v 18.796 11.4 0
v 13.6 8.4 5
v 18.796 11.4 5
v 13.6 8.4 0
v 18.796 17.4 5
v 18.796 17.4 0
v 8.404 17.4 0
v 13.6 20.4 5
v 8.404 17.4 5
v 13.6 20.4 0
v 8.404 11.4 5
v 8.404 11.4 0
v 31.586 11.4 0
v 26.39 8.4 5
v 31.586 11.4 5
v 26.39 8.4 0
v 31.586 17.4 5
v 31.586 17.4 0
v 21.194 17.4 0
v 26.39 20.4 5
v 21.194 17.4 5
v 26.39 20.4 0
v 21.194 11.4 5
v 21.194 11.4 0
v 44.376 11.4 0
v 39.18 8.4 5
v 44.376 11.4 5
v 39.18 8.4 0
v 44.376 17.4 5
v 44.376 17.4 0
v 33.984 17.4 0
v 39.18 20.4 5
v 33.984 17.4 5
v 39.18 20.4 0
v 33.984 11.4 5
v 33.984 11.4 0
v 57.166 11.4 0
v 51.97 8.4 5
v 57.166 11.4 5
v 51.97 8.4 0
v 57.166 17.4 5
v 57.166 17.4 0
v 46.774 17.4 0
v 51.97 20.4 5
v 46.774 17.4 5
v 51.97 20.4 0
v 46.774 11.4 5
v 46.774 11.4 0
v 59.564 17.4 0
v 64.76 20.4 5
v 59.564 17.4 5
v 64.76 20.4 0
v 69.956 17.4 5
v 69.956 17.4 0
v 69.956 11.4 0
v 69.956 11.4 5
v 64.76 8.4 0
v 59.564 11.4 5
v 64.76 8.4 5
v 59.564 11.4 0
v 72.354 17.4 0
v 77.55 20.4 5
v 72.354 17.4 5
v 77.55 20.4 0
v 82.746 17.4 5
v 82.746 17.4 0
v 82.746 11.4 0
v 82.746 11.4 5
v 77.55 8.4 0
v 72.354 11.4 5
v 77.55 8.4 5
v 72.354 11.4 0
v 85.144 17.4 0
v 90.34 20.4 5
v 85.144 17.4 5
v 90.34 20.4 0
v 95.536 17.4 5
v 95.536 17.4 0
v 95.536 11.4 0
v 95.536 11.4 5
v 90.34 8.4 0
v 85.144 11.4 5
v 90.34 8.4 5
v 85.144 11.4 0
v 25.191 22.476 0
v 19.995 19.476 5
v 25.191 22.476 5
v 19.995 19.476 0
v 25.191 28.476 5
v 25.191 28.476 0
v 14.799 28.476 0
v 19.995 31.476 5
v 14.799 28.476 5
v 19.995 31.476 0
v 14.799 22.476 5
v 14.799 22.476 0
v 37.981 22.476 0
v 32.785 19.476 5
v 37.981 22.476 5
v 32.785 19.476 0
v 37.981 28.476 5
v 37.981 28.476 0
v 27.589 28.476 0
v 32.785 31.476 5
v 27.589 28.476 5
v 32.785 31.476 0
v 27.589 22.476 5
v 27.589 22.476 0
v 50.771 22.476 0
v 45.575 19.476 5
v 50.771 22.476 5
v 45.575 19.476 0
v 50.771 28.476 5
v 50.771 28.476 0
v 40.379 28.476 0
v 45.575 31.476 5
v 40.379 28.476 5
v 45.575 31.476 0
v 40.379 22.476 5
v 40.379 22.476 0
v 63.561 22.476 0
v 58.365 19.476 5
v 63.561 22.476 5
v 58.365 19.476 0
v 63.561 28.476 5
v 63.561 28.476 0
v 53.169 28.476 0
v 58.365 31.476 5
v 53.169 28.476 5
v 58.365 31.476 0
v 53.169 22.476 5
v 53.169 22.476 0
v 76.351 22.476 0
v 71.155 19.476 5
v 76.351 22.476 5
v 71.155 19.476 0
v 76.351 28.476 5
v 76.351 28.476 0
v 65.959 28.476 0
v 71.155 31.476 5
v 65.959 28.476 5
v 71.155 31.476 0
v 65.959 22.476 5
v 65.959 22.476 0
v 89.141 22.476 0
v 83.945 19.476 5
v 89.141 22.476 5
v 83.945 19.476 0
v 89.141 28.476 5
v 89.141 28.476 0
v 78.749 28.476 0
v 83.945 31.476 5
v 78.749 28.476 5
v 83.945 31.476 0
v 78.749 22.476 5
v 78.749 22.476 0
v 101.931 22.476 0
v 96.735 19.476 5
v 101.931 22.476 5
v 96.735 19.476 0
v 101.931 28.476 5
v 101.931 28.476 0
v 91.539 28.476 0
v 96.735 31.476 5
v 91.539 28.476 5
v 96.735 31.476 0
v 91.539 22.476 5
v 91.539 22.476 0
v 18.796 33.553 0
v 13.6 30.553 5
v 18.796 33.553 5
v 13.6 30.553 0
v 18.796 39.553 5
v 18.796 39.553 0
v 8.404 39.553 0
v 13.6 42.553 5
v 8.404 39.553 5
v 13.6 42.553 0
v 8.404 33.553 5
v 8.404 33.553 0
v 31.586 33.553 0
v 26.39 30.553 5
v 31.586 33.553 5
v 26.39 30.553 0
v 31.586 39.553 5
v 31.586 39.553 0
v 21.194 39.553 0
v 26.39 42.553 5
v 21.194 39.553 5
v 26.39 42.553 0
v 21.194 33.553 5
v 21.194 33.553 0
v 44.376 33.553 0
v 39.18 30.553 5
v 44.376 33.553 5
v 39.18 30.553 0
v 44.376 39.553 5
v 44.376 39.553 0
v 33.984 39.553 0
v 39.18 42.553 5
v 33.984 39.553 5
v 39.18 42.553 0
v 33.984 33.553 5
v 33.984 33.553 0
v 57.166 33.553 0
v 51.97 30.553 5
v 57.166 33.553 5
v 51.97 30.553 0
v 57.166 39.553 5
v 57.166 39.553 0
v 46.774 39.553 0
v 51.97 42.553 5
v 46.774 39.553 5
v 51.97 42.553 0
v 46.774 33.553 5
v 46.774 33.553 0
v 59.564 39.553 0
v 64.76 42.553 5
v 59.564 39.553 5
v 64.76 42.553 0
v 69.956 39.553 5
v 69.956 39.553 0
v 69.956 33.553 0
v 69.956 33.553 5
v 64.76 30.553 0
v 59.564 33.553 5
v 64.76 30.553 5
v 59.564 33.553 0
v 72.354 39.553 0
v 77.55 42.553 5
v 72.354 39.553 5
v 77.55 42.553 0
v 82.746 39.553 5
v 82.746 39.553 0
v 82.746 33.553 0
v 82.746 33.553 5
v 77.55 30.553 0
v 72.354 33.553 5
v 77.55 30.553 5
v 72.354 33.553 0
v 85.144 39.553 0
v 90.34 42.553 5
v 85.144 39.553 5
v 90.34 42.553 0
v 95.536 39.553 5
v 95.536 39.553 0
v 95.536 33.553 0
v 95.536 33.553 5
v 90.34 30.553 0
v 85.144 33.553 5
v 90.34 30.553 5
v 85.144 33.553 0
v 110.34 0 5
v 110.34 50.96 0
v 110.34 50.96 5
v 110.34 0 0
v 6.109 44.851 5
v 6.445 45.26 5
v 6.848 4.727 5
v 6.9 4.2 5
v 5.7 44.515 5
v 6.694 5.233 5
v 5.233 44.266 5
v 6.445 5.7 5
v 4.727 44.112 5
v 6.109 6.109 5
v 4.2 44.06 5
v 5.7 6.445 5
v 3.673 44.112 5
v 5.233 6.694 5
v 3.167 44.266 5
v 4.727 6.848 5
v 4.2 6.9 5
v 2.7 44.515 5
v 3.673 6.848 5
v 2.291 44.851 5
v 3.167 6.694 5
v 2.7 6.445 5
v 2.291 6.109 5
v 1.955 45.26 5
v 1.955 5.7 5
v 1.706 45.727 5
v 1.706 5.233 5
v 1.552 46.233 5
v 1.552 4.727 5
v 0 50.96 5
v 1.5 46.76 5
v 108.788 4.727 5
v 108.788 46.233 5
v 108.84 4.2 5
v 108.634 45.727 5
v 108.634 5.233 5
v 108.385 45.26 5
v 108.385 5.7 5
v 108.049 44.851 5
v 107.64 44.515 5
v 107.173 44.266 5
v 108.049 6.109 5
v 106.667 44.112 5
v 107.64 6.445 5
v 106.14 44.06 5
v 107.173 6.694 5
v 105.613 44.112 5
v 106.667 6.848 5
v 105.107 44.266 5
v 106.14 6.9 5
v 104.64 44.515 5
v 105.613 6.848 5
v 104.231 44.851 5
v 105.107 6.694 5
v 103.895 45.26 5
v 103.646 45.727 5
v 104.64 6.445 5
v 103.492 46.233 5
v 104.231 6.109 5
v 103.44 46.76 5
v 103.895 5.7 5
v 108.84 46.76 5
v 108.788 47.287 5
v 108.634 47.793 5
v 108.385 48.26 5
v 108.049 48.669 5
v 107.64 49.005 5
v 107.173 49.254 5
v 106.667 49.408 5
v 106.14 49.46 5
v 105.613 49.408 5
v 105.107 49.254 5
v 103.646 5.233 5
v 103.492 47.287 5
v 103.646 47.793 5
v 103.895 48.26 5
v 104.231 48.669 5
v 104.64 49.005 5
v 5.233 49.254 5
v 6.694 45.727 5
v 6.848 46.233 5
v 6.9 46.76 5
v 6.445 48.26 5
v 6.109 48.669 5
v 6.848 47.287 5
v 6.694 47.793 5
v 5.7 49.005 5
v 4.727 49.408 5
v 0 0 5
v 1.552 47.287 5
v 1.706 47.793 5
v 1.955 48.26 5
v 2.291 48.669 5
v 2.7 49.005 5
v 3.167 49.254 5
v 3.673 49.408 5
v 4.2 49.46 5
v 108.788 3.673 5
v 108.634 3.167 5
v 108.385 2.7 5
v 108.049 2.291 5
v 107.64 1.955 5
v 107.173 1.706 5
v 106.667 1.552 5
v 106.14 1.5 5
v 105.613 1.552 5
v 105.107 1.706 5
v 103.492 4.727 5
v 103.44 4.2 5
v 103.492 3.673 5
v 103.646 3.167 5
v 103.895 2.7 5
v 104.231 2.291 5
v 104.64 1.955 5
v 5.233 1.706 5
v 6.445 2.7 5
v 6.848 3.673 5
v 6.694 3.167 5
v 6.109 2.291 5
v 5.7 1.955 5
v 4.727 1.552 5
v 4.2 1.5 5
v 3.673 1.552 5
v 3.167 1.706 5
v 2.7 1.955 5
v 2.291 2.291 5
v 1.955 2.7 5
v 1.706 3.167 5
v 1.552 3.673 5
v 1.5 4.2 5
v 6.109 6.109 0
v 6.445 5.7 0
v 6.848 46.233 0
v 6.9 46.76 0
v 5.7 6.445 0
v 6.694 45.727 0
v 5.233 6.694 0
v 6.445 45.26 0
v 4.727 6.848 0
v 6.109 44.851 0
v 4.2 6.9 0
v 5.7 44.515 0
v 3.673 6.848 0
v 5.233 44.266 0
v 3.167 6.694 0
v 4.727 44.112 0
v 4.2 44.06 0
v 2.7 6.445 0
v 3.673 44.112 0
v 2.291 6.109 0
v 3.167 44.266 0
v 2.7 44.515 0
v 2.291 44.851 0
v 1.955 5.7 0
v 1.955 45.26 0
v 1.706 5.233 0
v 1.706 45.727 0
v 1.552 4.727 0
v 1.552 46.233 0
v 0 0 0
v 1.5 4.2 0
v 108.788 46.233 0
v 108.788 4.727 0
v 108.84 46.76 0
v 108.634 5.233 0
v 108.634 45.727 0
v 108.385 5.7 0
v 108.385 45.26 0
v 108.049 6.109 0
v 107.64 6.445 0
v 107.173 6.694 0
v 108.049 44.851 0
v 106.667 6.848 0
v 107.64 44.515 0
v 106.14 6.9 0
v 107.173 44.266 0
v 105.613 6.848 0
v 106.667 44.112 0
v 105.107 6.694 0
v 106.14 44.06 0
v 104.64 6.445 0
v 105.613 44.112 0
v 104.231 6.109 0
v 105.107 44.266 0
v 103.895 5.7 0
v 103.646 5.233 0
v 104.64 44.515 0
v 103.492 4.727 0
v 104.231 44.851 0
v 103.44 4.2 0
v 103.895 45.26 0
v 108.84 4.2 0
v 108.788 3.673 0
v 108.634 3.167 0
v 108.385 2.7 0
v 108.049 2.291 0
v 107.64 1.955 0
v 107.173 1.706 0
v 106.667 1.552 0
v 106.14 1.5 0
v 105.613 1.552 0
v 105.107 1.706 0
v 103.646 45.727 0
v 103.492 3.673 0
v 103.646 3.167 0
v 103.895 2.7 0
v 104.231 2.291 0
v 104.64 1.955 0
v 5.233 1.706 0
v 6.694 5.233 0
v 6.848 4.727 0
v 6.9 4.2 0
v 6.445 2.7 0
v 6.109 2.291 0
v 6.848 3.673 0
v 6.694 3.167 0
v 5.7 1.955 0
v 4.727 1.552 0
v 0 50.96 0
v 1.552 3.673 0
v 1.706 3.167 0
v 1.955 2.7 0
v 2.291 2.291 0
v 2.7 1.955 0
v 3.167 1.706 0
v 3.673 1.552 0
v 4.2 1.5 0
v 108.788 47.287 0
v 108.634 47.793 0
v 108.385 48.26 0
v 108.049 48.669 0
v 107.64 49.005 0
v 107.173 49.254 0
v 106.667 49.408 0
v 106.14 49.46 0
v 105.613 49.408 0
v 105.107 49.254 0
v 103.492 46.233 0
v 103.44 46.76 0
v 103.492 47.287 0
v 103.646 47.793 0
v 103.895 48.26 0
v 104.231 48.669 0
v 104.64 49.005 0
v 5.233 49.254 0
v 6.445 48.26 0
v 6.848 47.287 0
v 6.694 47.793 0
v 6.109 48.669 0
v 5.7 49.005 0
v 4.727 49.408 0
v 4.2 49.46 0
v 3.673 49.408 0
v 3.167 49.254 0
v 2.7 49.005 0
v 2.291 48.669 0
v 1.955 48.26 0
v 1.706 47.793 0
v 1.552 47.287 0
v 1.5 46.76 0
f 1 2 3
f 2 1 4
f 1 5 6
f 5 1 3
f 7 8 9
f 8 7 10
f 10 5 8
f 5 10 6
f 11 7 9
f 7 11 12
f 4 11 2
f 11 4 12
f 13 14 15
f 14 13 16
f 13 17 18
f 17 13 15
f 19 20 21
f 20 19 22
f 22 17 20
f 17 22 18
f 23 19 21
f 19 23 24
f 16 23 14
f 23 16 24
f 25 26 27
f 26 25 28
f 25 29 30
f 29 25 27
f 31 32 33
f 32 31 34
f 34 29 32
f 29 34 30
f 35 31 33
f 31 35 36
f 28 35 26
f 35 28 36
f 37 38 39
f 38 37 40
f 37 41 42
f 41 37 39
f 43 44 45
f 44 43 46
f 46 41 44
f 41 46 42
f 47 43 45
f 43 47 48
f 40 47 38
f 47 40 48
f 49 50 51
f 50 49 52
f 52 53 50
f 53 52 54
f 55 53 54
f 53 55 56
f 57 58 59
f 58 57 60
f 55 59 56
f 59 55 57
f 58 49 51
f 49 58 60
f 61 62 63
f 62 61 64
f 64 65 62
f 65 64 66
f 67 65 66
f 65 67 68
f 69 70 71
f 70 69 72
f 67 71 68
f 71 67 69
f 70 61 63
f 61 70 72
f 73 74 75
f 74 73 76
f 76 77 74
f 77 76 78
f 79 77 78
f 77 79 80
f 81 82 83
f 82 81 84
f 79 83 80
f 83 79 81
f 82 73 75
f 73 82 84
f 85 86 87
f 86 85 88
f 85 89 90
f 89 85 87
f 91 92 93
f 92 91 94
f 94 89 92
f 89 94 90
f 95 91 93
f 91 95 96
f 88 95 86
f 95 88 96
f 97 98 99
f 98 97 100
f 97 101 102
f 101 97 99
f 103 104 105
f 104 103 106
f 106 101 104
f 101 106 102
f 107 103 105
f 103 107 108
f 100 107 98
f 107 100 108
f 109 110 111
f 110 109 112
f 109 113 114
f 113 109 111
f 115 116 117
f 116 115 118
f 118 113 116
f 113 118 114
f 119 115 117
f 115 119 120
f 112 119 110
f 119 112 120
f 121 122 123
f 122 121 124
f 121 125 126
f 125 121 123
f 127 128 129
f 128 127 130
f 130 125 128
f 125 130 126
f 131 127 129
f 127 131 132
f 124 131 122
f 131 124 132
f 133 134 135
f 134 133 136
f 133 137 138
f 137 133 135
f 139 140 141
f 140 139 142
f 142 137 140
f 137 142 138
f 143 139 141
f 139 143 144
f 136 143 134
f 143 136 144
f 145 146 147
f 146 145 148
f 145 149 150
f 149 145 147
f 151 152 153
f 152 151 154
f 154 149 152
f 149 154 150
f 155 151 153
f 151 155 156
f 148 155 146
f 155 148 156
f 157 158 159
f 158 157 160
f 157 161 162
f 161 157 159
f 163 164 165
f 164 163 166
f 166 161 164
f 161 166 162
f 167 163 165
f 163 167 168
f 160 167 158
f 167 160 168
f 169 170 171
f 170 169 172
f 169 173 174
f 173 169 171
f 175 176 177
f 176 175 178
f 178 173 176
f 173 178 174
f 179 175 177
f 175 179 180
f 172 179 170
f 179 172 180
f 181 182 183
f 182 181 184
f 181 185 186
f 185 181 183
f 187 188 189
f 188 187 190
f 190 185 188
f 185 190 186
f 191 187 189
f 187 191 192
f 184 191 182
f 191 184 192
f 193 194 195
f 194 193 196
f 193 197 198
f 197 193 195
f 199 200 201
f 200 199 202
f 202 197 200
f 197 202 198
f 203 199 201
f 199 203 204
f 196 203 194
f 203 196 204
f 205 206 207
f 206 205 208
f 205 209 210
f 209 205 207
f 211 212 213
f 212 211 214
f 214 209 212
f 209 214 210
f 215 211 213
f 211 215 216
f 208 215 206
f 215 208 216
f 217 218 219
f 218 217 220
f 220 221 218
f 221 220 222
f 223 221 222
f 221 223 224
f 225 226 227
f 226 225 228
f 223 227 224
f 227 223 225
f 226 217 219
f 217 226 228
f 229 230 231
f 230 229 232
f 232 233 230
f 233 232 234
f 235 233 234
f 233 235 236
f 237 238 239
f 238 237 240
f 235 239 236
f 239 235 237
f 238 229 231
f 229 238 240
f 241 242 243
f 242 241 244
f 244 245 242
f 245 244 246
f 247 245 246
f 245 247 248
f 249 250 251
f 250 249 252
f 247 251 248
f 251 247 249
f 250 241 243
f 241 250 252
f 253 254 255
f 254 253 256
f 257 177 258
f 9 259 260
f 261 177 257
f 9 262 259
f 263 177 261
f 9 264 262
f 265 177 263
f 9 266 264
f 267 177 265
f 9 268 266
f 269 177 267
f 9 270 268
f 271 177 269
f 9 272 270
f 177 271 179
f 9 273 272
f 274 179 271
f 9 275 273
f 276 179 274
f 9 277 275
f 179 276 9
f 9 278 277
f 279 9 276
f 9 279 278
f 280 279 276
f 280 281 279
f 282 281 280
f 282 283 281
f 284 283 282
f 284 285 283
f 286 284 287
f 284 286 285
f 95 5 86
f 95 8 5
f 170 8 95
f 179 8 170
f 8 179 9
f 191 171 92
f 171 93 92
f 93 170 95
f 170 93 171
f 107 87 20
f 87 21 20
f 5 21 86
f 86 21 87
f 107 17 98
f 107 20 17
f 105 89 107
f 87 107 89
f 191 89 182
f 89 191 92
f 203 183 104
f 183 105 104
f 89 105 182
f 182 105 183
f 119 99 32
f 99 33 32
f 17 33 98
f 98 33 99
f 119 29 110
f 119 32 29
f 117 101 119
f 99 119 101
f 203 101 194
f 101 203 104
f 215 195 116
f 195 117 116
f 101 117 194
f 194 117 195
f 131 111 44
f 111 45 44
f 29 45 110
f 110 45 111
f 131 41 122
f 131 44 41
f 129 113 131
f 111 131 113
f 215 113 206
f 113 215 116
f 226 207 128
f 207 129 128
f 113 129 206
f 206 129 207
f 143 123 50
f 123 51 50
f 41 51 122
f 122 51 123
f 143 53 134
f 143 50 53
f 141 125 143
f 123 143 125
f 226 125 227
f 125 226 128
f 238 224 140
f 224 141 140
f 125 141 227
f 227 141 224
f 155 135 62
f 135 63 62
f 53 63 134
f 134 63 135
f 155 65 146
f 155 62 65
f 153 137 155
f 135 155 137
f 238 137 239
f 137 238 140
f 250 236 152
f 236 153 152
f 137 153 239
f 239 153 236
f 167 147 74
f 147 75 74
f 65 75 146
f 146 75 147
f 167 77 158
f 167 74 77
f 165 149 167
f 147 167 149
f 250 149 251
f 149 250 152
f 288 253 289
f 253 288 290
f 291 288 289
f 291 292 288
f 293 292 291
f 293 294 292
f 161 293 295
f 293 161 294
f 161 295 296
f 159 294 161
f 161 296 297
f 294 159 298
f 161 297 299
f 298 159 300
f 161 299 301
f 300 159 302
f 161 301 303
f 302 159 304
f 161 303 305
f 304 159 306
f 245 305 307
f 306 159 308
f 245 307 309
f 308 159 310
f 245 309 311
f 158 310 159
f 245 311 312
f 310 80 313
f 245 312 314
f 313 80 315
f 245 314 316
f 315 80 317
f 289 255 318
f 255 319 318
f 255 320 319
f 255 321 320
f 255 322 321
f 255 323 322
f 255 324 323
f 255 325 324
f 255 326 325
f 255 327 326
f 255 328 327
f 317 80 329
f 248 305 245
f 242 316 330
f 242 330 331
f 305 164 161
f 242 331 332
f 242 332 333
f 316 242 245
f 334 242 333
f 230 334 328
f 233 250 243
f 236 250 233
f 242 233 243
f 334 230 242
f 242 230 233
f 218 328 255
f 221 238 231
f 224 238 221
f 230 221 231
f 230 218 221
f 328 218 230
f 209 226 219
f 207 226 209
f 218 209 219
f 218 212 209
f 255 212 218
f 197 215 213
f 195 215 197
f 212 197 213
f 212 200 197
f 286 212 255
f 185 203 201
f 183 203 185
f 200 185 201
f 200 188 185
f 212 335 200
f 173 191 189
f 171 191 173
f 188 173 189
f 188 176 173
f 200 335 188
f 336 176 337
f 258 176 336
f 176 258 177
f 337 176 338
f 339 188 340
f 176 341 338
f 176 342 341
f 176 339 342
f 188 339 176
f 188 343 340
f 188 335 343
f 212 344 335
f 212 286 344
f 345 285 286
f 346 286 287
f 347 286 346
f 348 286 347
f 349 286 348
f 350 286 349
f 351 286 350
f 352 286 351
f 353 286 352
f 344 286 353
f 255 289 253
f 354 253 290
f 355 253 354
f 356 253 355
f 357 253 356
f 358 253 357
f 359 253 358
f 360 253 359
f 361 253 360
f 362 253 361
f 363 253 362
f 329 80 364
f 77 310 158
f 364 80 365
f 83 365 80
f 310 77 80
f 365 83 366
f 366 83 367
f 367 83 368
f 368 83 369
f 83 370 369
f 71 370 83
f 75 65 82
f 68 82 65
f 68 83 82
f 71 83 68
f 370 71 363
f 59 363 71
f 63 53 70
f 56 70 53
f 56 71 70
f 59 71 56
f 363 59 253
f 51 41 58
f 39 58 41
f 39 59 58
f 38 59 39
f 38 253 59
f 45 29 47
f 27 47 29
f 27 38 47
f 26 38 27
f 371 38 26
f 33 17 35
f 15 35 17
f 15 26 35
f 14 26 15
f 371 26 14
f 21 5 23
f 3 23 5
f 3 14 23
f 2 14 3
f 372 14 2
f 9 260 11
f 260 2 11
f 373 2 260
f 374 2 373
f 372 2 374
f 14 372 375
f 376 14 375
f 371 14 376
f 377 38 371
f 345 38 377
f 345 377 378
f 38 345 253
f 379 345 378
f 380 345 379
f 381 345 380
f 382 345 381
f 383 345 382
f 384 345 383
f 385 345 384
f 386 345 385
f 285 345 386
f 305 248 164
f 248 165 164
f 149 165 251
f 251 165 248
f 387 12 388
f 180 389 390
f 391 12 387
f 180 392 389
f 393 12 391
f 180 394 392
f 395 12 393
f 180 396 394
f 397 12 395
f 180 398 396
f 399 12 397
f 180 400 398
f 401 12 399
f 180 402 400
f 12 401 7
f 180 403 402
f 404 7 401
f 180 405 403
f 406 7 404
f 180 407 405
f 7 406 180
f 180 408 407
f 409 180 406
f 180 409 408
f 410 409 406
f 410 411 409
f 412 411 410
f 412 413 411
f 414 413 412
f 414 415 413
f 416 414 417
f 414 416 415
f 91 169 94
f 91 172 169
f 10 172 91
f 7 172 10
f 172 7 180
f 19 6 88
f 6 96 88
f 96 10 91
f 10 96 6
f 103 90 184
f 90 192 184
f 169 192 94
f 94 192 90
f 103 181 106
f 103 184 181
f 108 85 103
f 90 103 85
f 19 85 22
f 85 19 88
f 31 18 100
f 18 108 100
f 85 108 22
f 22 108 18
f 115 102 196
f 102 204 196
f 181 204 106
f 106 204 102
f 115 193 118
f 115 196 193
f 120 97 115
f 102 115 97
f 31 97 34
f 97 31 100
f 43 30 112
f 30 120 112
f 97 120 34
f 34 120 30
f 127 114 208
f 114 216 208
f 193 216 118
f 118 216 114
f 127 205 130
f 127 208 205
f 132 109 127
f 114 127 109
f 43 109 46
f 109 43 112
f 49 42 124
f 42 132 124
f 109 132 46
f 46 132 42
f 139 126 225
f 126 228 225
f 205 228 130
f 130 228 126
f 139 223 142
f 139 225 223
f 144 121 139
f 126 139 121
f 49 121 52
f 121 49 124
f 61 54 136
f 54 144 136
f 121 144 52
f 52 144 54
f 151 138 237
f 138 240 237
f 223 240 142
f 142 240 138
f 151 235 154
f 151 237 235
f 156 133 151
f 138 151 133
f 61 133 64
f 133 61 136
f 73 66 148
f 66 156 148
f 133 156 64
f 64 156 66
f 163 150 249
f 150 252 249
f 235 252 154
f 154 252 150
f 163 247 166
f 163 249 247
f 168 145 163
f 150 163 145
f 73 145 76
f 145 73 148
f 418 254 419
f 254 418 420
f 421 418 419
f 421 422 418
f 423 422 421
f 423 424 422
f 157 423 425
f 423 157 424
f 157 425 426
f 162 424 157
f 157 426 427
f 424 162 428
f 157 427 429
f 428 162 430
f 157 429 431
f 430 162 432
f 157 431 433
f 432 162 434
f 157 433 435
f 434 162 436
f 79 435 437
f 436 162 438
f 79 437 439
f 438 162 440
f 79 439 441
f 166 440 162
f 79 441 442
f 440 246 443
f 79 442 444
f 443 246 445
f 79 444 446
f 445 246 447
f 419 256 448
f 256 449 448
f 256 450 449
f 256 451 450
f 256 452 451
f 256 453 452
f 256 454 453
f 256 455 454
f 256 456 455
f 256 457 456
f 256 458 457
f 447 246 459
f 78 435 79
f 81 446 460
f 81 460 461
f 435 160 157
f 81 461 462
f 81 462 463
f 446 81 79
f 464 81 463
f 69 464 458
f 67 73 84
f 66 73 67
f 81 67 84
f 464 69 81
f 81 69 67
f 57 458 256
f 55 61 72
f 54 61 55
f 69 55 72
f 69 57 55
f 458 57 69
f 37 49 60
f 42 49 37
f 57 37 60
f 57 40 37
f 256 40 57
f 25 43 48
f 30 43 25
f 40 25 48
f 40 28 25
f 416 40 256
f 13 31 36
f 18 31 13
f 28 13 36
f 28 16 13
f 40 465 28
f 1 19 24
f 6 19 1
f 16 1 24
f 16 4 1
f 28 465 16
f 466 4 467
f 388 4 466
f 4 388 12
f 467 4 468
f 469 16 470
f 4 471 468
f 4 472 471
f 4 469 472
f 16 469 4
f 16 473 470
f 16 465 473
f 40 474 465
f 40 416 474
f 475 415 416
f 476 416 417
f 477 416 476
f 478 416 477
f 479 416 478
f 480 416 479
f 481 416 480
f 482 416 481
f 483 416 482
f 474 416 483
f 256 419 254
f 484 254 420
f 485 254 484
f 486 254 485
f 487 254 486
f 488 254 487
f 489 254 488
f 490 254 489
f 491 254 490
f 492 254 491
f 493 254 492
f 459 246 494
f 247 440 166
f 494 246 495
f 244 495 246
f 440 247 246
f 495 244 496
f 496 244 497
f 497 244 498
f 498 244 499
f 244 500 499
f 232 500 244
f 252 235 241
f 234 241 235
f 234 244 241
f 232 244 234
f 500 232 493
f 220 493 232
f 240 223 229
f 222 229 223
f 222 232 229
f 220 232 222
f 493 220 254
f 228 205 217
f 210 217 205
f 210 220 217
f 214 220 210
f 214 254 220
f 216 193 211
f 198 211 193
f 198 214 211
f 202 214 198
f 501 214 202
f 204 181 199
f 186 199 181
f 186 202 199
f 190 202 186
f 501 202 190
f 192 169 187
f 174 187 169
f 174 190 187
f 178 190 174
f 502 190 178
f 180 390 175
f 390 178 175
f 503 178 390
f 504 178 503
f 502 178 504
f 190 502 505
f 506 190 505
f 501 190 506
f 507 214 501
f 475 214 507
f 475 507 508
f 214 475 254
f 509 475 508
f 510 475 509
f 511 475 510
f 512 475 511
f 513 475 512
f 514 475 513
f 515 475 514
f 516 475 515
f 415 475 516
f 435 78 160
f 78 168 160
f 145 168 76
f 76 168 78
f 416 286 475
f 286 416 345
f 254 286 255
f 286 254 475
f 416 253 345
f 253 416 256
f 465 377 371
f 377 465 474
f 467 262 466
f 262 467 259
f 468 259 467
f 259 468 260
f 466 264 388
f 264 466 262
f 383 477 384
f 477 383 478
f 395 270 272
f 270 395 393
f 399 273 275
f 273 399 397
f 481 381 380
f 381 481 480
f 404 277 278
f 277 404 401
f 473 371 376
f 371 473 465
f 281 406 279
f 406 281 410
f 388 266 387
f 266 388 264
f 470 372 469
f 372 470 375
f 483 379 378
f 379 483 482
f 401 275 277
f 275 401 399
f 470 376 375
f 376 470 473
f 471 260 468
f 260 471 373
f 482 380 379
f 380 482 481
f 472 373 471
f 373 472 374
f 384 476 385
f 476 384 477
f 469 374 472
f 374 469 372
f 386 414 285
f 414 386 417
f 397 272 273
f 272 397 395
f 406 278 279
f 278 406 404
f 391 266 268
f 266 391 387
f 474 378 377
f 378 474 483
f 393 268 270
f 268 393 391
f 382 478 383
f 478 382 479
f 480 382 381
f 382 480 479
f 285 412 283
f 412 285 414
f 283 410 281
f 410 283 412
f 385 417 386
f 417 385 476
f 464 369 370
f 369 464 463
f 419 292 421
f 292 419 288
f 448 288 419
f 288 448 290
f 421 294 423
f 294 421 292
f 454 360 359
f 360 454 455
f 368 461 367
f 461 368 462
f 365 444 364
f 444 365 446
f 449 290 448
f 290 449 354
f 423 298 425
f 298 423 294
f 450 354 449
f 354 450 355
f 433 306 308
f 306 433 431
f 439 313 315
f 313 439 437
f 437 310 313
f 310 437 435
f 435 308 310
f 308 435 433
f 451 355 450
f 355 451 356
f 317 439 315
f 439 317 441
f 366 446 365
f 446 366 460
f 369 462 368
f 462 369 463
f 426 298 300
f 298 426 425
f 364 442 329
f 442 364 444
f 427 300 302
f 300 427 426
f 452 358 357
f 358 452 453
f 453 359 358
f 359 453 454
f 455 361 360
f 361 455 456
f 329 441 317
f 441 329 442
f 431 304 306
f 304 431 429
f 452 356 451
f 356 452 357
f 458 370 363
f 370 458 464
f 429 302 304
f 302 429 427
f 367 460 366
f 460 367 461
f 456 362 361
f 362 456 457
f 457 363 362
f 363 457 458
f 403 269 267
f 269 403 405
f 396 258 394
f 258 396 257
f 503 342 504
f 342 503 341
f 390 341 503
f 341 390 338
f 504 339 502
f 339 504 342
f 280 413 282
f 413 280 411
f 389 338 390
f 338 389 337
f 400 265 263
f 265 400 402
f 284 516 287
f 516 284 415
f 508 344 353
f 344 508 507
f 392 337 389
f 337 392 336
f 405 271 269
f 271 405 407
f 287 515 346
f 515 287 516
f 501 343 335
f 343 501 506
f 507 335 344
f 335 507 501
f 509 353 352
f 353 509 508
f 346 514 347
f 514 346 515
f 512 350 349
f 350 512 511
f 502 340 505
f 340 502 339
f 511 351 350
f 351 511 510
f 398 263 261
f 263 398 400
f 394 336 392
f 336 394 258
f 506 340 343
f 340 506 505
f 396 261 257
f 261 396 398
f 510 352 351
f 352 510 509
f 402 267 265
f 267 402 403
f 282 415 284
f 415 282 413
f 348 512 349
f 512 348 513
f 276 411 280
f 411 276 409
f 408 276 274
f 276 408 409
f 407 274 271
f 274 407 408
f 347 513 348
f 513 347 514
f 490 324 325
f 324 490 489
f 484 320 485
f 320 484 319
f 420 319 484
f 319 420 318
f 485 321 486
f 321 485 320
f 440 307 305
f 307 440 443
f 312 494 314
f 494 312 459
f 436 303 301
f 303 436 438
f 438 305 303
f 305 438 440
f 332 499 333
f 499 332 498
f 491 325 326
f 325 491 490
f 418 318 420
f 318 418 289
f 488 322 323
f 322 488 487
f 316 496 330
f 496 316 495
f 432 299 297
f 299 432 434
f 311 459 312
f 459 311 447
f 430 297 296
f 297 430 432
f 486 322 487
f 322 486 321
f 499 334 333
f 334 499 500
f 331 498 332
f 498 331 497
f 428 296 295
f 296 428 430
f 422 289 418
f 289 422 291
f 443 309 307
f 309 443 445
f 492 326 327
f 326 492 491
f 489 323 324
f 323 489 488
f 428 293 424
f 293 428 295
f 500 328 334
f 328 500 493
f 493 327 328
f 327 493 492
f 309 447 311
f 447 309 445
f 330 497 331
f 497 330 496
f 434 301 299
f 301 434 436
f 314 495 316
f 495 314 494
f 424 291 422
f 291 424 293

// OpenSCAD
$fn = 32;

// ----------------------------------------------------------------------
// Honeycomb panel: 110.34 x 50.96 mm, 21 cells of 12 mm
// ----------------------------------------------------------------------

// --- parameters (mm) ---
panel_w = 110.34;         // panel width
panel_d = 50.96;          // panel depth
thick = 5;                // panel thickness
cell_r = 6;               // hex cell circumradius
pitch = 12.79;            // hex cell pitch (centre to centre)
web = 2.4;                // web between the cells
columns = 7;              // columns of cells
rows = 3;                 // rows of cells
cell_count = 21;          // total cells
shift_x = 13.6;           // first cell offset in x
shift_y = 14.4;           // first cell offset in y
mount_d = 5.4;            // corner mounting holes
hole_off = 4.2;           // mounting hole offset from the corners

difference() {
  union() {
    cube([panel_w, panel_d, thick]);
  }
  /* hexagonal cells, point-up, cut right through the plate */
  for (row = [0 : rows - 1]) {
    for (col = [0 : columns - 1]) {
      translate([shift_x + col * pitch + (row % 2) * pitch / 2, shift_y + row * pitch * 0.866025, -2.5]) rotate([0, 0, 30]) cylinder(h = thick + 5, d = 2 * cell_r, $fn = 6);
    }
  }
  /* corner mounting holes, clear of the outer cell web */
  translate([4.2, 4.2, -2.5]) cylinder(h = thick + 5, d = mount_d);
  translate([106.14, 4.2, -2.5]) cylinder(h = thick + 5, d = mount_d);
  translate([4.2, 46.76, -2.5]) cylinder(h = thick + 5, d = mount_d);
  translate([106.14, 46.76, -2.5]) cylinder(h = thick + 5, d = mount_d);
}
